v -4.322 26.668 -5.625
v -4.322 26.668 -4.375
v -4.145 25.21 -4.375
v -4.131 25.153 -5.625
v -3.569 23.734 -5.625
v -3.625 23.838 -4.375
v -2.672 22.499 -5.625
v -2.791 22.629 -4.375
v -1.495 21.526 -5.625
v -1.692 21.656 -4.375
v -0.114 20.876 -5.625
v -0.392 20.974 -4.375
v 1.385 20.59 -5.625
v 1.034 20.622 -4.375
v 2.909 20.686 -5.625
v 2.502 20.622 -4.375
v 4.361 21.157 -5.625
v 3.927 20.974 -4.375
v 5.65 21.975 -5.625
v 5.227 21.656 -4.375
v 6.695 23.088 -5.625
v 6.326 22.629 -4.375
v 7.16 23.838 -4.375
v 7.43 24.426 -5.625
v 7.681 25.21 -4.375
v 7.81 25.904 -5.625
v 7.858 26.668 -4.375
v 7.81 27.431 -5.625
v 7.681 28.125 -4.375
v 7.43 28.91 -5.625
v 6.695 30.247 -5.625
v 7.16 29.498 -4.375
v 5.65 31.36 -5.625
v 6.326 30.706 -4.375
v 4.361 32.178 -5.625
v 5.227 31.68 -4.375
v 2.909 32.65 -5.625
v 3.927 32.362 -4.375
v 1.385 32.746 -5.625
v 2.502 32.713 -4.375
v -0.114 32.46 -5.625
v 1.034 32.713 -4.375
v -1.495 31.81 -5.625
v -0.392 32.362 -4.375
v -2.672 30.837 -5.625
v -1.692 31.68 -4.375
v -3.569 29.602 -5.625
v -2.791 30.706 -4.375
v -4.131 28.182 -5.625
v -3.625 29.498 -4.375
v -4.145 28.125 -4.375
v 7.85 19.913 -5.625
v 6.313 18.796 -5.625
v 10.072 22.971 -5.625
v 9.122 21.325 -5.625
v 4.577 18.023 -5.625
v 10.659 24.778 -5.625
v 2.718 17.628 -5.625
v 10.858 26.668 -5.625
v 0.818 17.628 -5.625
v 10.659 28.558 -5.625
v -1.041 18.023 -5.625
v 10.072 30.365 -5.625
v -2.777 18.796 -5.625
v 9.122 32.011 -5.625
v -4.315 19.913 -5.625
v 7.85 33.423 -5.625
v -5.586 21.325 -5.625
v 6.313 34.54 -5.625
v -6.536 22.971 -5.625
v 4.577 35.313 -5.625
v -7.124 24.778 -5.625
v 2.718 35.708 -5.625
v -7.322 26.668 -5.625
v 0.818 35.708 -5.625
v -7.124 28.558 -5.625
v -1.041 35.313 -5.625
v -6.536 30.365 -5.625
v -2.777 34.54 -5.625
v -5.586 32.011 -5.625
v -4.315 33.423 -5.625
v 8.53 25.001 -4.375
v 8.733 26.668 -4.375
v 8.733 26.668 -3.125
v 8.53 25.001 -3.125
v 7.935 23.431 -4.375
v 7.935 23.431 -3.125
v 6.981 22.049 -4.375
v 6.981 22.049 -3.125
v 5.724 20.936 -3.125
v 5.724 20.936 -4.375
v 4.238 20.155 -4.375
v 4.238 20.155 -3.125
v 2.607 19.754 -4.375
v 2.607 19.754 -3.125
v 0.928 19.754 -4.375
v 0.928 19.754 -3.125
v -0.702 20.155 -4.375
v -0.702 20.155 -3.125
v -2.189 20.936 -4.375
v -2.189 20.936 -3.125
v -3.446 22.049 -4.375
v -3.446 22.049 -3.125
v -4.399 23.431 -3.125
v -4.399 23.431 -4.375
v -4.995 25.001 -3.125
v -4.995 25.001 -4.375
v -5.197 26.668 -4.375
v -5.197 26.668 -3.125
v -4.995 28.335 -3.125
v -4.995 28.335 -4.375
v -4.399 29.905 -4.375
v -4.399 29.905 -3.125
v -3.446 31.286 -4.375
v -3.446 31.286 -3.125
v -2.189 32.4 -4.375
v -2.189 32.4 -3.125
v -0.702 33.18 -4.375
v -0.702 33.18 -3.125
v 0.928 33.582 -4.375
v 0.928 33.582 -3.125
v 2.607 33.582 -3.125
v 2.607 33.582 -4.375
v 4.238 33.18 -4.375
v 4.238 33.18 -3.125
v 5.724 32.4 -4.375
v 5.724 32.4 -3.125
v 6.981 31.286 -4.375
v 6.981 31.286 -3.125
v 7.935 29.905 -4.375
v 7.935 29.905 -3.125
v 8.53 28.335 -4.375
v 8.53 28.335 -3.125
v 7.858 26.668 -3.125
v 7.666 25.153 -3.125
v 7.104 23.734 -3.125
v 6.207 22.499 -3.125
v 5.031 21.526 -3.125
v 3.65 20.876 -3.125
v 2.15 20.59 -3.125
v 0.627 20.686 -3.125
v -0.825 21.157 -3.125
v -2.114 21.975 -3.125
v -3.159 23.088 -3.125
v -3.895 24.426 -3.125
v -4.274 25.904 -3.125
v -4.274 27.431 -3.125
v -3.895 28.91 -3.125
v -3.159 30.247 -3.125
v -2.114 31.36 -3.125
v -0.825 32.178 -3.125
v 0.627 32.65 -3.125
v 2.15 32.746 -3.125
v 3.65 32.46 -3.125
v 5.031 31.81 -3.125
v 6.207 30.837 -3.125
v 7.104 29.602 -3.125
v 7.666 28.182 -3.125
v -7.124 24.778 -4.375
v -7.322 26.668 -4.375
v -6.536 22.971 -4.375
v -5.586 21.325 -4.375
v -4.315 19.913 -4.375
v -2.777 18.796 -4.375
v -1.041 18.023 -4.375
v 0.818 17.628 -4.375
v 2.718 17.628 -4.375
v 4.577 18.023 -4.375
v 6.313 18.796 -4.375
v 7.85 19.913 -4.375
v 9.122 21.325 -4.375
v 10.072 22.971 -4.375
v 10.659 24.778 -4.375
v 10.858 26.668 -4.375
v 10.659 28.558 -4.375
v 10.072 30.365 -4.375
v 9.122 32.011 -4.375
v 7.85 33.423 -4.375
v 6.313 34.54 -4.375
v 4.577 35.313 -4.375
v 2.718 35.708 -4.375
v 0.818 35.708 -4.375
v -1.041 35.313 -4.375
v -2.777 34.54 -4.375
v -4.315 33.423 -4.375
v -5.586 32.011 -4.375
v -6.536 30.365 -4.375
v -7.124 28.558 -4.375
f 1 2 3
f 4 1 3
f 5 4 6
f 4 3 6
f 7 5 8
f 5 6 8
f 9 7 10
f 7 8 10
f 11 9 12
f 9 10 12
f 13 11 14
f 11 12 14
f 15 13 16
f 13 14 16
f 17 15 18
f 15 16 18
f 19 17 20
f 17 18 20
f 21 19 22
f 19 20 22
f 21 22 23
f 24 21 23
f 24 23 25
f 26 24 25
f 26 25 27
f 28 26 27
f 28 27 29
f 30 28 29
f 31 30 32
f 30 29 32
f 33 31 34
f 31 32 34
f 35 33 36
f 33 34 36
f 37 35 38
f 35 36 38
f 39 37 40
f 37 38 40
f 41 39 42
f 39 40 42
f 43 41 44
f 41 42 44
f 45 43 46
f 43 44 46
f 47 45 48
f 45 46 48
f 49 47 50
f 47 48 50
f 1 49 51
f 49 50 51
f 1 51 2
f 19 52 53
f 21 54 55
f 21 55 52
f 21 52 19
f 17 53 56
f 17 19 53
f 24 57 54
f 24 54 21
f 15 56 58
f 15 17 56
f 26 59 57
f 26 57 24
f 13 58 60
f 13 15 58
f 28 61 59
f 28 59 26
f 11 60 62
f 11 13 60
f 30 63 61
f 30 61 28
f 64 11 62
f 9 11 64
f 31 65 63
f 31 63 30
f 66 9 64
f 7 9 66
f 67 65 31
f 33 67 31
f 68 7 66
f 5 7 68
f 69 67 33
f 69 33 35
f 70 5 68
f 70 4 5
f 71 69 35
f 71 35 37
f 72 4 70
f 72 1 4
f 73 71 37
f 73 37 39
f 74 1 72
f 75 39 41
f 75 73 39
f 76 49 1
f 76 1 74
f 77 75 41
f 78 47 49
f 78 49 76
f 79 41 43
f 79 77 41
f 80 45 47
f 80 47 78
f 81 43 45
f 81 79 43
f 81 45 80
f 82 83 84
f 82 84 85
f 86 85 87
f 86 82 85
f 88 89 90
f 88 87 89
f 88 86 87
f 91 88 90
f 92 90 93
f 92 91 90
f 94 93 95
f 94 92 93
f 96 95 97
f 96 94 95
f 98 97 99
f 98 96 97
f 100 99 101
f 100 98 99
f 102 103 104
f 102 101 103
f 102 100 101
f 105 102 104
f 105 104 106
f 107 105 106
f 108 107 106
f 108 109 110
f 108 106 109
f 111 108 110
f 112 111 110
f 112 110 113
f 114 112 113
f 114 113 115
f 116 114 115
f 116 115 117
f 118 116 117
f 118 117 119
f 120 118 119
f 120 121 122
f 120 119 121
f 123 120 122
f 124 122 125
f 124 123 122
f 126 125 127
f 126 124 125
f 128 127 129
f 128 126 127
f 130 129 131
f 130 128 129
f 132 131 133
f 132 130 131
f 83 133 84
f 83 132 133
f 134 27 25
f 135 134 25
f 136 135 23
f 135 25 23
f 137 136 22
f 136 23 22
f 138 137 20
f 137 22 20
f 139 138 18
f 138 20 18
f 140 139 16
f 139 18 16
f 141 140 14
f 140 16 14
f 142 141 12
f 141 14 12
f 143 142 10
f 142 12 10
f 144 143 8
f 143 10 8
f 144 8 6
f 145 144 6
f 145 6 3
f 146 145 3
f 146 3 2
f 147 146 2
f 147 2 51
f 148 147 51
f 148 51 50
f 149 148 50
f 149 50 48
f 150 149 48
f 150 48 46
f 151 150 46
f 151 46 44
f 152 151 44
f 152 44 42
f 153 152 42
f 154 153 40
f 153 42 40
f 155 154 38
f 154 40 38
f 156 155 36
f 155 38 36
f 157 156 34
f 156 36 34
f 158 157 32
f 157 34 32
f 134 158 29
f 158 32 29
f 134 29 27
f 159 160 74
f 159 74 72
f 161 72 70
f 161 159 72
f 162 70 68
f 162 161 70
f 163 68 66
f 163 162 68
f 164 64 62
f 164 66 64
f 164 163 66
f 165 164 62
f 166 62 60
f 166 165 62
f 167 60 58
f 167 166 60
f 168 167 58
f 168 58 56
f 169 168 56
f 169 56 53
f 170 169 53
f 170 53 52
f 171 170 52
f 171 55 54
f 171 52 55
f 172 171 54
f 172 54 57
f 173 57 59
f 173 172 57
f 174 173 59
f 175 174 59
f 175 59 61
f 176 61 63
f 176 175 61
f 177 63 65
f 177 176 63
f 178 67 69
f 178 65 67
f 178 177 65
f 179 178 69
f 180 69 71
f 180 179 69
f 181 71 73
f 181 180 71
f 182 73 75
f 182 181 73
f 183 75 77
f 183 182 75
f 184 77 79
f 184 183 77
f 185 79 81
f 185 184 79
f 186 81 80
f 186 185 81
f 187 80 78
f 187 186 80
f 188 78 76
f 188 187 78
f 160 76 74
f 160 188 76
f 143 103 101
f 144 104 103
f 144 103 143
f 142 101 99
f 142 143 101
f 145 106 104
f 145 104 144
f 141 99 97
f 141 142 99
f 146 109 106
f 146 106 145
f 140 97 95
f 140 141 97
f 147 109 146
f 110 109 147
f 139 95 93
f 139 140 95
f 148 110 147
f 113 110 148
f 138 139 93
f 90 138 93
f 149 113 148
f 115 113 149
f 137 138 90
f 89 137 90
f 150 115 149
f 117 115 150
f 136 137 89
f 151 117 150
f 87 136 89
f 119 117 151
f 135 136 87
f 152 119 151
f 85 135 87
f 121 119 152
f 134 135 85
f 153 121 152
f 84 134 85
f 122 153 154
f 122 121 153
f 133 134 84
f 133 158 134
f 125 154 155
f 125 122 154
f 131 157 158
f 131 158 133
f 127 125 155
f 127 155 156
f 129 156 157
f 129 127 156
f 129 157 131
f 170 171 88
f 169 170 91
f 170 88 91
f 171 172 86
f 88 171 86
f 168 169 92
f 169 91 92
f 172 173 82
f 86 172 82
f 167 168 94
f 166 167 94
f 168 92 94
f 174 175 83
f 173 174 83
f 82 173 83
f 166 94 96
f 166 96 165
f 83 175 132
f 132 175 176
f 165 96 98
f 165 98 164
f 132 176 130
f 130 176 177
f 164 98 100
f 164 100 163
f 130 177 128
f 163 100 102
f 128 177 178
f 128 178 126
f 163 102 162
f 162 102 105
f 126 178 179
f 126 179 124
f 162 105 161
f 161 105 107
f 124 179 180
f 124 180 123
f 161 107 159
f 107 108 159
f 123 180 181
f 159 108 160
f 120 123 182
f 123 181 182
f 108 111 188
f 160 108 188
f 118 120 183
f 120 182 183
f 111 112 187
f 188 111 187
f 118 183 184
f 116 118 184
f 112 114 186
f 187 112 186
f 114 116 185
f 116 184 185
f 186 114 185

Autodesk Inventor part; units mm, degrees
ref_plane "YZ Plane" through (0, 0, 0) normal (1, 0, 0) x (0, 1, 0)
ref_plane "XZ Plane" through (0, 0, 0) normal (0, 1, 0) x (-1, 0, 0)
sketch "Sketch1" plane through (0, 0, 0) normal (0, 0, 1) x (1, 0, 0)
  circle A0 centre (1.767767, 26.667767) radius 7
  circle A1 centre (1.767767, 26.667767) radius 6.965
  circle A2 centre (1.767767, 26.667767) radius 6.09
  point P0 (0, 0)
  dimension "d0" = 0.035
  dimension "d2" = 0.875
ref_plane "Work Plane1" through (-19.467767, 1.0375, -4.375) normal (0, 0, -1) x (0, 1, 0)
sketch "Sketch1 outline for Extrusion1" plane through (0, 0, 0) normal (0, 0, 1) x (1, 0, 0)
  circle A0 centre (1.767767, 26.667767) radius 6.965
  circle A1 centre (1.767767, 26.667767) radius 6.09
extrude "Extrusion1" add sketch "Sketch1 outline for Extrusion1" along normal blind 1.25 from surface at -4.375
sketch "Sketch2" plane through (1.767767, 26.667767, -4.375) normal (0, 0, -1) x (-1, 0, 0)
  circle A0 centre (0, 0) radius 6.965 projected
  circle A1 centre (0, 0) radius 6.09 projected
  circle A2 centre (0, 0) radius 7.09
  circle A3 centre (0, 0) radius 9.09
  point P0 (1.767767, -26.667767)
  dimension "d5" = 0.125
  dimension "d6" = 2
extrude "Extrusion2" add sketch "Sketch2" along normal blind 1.25 contours A0 | A2 | A3
properties part number "Half Inch Lense Holder Cover (V5)"
